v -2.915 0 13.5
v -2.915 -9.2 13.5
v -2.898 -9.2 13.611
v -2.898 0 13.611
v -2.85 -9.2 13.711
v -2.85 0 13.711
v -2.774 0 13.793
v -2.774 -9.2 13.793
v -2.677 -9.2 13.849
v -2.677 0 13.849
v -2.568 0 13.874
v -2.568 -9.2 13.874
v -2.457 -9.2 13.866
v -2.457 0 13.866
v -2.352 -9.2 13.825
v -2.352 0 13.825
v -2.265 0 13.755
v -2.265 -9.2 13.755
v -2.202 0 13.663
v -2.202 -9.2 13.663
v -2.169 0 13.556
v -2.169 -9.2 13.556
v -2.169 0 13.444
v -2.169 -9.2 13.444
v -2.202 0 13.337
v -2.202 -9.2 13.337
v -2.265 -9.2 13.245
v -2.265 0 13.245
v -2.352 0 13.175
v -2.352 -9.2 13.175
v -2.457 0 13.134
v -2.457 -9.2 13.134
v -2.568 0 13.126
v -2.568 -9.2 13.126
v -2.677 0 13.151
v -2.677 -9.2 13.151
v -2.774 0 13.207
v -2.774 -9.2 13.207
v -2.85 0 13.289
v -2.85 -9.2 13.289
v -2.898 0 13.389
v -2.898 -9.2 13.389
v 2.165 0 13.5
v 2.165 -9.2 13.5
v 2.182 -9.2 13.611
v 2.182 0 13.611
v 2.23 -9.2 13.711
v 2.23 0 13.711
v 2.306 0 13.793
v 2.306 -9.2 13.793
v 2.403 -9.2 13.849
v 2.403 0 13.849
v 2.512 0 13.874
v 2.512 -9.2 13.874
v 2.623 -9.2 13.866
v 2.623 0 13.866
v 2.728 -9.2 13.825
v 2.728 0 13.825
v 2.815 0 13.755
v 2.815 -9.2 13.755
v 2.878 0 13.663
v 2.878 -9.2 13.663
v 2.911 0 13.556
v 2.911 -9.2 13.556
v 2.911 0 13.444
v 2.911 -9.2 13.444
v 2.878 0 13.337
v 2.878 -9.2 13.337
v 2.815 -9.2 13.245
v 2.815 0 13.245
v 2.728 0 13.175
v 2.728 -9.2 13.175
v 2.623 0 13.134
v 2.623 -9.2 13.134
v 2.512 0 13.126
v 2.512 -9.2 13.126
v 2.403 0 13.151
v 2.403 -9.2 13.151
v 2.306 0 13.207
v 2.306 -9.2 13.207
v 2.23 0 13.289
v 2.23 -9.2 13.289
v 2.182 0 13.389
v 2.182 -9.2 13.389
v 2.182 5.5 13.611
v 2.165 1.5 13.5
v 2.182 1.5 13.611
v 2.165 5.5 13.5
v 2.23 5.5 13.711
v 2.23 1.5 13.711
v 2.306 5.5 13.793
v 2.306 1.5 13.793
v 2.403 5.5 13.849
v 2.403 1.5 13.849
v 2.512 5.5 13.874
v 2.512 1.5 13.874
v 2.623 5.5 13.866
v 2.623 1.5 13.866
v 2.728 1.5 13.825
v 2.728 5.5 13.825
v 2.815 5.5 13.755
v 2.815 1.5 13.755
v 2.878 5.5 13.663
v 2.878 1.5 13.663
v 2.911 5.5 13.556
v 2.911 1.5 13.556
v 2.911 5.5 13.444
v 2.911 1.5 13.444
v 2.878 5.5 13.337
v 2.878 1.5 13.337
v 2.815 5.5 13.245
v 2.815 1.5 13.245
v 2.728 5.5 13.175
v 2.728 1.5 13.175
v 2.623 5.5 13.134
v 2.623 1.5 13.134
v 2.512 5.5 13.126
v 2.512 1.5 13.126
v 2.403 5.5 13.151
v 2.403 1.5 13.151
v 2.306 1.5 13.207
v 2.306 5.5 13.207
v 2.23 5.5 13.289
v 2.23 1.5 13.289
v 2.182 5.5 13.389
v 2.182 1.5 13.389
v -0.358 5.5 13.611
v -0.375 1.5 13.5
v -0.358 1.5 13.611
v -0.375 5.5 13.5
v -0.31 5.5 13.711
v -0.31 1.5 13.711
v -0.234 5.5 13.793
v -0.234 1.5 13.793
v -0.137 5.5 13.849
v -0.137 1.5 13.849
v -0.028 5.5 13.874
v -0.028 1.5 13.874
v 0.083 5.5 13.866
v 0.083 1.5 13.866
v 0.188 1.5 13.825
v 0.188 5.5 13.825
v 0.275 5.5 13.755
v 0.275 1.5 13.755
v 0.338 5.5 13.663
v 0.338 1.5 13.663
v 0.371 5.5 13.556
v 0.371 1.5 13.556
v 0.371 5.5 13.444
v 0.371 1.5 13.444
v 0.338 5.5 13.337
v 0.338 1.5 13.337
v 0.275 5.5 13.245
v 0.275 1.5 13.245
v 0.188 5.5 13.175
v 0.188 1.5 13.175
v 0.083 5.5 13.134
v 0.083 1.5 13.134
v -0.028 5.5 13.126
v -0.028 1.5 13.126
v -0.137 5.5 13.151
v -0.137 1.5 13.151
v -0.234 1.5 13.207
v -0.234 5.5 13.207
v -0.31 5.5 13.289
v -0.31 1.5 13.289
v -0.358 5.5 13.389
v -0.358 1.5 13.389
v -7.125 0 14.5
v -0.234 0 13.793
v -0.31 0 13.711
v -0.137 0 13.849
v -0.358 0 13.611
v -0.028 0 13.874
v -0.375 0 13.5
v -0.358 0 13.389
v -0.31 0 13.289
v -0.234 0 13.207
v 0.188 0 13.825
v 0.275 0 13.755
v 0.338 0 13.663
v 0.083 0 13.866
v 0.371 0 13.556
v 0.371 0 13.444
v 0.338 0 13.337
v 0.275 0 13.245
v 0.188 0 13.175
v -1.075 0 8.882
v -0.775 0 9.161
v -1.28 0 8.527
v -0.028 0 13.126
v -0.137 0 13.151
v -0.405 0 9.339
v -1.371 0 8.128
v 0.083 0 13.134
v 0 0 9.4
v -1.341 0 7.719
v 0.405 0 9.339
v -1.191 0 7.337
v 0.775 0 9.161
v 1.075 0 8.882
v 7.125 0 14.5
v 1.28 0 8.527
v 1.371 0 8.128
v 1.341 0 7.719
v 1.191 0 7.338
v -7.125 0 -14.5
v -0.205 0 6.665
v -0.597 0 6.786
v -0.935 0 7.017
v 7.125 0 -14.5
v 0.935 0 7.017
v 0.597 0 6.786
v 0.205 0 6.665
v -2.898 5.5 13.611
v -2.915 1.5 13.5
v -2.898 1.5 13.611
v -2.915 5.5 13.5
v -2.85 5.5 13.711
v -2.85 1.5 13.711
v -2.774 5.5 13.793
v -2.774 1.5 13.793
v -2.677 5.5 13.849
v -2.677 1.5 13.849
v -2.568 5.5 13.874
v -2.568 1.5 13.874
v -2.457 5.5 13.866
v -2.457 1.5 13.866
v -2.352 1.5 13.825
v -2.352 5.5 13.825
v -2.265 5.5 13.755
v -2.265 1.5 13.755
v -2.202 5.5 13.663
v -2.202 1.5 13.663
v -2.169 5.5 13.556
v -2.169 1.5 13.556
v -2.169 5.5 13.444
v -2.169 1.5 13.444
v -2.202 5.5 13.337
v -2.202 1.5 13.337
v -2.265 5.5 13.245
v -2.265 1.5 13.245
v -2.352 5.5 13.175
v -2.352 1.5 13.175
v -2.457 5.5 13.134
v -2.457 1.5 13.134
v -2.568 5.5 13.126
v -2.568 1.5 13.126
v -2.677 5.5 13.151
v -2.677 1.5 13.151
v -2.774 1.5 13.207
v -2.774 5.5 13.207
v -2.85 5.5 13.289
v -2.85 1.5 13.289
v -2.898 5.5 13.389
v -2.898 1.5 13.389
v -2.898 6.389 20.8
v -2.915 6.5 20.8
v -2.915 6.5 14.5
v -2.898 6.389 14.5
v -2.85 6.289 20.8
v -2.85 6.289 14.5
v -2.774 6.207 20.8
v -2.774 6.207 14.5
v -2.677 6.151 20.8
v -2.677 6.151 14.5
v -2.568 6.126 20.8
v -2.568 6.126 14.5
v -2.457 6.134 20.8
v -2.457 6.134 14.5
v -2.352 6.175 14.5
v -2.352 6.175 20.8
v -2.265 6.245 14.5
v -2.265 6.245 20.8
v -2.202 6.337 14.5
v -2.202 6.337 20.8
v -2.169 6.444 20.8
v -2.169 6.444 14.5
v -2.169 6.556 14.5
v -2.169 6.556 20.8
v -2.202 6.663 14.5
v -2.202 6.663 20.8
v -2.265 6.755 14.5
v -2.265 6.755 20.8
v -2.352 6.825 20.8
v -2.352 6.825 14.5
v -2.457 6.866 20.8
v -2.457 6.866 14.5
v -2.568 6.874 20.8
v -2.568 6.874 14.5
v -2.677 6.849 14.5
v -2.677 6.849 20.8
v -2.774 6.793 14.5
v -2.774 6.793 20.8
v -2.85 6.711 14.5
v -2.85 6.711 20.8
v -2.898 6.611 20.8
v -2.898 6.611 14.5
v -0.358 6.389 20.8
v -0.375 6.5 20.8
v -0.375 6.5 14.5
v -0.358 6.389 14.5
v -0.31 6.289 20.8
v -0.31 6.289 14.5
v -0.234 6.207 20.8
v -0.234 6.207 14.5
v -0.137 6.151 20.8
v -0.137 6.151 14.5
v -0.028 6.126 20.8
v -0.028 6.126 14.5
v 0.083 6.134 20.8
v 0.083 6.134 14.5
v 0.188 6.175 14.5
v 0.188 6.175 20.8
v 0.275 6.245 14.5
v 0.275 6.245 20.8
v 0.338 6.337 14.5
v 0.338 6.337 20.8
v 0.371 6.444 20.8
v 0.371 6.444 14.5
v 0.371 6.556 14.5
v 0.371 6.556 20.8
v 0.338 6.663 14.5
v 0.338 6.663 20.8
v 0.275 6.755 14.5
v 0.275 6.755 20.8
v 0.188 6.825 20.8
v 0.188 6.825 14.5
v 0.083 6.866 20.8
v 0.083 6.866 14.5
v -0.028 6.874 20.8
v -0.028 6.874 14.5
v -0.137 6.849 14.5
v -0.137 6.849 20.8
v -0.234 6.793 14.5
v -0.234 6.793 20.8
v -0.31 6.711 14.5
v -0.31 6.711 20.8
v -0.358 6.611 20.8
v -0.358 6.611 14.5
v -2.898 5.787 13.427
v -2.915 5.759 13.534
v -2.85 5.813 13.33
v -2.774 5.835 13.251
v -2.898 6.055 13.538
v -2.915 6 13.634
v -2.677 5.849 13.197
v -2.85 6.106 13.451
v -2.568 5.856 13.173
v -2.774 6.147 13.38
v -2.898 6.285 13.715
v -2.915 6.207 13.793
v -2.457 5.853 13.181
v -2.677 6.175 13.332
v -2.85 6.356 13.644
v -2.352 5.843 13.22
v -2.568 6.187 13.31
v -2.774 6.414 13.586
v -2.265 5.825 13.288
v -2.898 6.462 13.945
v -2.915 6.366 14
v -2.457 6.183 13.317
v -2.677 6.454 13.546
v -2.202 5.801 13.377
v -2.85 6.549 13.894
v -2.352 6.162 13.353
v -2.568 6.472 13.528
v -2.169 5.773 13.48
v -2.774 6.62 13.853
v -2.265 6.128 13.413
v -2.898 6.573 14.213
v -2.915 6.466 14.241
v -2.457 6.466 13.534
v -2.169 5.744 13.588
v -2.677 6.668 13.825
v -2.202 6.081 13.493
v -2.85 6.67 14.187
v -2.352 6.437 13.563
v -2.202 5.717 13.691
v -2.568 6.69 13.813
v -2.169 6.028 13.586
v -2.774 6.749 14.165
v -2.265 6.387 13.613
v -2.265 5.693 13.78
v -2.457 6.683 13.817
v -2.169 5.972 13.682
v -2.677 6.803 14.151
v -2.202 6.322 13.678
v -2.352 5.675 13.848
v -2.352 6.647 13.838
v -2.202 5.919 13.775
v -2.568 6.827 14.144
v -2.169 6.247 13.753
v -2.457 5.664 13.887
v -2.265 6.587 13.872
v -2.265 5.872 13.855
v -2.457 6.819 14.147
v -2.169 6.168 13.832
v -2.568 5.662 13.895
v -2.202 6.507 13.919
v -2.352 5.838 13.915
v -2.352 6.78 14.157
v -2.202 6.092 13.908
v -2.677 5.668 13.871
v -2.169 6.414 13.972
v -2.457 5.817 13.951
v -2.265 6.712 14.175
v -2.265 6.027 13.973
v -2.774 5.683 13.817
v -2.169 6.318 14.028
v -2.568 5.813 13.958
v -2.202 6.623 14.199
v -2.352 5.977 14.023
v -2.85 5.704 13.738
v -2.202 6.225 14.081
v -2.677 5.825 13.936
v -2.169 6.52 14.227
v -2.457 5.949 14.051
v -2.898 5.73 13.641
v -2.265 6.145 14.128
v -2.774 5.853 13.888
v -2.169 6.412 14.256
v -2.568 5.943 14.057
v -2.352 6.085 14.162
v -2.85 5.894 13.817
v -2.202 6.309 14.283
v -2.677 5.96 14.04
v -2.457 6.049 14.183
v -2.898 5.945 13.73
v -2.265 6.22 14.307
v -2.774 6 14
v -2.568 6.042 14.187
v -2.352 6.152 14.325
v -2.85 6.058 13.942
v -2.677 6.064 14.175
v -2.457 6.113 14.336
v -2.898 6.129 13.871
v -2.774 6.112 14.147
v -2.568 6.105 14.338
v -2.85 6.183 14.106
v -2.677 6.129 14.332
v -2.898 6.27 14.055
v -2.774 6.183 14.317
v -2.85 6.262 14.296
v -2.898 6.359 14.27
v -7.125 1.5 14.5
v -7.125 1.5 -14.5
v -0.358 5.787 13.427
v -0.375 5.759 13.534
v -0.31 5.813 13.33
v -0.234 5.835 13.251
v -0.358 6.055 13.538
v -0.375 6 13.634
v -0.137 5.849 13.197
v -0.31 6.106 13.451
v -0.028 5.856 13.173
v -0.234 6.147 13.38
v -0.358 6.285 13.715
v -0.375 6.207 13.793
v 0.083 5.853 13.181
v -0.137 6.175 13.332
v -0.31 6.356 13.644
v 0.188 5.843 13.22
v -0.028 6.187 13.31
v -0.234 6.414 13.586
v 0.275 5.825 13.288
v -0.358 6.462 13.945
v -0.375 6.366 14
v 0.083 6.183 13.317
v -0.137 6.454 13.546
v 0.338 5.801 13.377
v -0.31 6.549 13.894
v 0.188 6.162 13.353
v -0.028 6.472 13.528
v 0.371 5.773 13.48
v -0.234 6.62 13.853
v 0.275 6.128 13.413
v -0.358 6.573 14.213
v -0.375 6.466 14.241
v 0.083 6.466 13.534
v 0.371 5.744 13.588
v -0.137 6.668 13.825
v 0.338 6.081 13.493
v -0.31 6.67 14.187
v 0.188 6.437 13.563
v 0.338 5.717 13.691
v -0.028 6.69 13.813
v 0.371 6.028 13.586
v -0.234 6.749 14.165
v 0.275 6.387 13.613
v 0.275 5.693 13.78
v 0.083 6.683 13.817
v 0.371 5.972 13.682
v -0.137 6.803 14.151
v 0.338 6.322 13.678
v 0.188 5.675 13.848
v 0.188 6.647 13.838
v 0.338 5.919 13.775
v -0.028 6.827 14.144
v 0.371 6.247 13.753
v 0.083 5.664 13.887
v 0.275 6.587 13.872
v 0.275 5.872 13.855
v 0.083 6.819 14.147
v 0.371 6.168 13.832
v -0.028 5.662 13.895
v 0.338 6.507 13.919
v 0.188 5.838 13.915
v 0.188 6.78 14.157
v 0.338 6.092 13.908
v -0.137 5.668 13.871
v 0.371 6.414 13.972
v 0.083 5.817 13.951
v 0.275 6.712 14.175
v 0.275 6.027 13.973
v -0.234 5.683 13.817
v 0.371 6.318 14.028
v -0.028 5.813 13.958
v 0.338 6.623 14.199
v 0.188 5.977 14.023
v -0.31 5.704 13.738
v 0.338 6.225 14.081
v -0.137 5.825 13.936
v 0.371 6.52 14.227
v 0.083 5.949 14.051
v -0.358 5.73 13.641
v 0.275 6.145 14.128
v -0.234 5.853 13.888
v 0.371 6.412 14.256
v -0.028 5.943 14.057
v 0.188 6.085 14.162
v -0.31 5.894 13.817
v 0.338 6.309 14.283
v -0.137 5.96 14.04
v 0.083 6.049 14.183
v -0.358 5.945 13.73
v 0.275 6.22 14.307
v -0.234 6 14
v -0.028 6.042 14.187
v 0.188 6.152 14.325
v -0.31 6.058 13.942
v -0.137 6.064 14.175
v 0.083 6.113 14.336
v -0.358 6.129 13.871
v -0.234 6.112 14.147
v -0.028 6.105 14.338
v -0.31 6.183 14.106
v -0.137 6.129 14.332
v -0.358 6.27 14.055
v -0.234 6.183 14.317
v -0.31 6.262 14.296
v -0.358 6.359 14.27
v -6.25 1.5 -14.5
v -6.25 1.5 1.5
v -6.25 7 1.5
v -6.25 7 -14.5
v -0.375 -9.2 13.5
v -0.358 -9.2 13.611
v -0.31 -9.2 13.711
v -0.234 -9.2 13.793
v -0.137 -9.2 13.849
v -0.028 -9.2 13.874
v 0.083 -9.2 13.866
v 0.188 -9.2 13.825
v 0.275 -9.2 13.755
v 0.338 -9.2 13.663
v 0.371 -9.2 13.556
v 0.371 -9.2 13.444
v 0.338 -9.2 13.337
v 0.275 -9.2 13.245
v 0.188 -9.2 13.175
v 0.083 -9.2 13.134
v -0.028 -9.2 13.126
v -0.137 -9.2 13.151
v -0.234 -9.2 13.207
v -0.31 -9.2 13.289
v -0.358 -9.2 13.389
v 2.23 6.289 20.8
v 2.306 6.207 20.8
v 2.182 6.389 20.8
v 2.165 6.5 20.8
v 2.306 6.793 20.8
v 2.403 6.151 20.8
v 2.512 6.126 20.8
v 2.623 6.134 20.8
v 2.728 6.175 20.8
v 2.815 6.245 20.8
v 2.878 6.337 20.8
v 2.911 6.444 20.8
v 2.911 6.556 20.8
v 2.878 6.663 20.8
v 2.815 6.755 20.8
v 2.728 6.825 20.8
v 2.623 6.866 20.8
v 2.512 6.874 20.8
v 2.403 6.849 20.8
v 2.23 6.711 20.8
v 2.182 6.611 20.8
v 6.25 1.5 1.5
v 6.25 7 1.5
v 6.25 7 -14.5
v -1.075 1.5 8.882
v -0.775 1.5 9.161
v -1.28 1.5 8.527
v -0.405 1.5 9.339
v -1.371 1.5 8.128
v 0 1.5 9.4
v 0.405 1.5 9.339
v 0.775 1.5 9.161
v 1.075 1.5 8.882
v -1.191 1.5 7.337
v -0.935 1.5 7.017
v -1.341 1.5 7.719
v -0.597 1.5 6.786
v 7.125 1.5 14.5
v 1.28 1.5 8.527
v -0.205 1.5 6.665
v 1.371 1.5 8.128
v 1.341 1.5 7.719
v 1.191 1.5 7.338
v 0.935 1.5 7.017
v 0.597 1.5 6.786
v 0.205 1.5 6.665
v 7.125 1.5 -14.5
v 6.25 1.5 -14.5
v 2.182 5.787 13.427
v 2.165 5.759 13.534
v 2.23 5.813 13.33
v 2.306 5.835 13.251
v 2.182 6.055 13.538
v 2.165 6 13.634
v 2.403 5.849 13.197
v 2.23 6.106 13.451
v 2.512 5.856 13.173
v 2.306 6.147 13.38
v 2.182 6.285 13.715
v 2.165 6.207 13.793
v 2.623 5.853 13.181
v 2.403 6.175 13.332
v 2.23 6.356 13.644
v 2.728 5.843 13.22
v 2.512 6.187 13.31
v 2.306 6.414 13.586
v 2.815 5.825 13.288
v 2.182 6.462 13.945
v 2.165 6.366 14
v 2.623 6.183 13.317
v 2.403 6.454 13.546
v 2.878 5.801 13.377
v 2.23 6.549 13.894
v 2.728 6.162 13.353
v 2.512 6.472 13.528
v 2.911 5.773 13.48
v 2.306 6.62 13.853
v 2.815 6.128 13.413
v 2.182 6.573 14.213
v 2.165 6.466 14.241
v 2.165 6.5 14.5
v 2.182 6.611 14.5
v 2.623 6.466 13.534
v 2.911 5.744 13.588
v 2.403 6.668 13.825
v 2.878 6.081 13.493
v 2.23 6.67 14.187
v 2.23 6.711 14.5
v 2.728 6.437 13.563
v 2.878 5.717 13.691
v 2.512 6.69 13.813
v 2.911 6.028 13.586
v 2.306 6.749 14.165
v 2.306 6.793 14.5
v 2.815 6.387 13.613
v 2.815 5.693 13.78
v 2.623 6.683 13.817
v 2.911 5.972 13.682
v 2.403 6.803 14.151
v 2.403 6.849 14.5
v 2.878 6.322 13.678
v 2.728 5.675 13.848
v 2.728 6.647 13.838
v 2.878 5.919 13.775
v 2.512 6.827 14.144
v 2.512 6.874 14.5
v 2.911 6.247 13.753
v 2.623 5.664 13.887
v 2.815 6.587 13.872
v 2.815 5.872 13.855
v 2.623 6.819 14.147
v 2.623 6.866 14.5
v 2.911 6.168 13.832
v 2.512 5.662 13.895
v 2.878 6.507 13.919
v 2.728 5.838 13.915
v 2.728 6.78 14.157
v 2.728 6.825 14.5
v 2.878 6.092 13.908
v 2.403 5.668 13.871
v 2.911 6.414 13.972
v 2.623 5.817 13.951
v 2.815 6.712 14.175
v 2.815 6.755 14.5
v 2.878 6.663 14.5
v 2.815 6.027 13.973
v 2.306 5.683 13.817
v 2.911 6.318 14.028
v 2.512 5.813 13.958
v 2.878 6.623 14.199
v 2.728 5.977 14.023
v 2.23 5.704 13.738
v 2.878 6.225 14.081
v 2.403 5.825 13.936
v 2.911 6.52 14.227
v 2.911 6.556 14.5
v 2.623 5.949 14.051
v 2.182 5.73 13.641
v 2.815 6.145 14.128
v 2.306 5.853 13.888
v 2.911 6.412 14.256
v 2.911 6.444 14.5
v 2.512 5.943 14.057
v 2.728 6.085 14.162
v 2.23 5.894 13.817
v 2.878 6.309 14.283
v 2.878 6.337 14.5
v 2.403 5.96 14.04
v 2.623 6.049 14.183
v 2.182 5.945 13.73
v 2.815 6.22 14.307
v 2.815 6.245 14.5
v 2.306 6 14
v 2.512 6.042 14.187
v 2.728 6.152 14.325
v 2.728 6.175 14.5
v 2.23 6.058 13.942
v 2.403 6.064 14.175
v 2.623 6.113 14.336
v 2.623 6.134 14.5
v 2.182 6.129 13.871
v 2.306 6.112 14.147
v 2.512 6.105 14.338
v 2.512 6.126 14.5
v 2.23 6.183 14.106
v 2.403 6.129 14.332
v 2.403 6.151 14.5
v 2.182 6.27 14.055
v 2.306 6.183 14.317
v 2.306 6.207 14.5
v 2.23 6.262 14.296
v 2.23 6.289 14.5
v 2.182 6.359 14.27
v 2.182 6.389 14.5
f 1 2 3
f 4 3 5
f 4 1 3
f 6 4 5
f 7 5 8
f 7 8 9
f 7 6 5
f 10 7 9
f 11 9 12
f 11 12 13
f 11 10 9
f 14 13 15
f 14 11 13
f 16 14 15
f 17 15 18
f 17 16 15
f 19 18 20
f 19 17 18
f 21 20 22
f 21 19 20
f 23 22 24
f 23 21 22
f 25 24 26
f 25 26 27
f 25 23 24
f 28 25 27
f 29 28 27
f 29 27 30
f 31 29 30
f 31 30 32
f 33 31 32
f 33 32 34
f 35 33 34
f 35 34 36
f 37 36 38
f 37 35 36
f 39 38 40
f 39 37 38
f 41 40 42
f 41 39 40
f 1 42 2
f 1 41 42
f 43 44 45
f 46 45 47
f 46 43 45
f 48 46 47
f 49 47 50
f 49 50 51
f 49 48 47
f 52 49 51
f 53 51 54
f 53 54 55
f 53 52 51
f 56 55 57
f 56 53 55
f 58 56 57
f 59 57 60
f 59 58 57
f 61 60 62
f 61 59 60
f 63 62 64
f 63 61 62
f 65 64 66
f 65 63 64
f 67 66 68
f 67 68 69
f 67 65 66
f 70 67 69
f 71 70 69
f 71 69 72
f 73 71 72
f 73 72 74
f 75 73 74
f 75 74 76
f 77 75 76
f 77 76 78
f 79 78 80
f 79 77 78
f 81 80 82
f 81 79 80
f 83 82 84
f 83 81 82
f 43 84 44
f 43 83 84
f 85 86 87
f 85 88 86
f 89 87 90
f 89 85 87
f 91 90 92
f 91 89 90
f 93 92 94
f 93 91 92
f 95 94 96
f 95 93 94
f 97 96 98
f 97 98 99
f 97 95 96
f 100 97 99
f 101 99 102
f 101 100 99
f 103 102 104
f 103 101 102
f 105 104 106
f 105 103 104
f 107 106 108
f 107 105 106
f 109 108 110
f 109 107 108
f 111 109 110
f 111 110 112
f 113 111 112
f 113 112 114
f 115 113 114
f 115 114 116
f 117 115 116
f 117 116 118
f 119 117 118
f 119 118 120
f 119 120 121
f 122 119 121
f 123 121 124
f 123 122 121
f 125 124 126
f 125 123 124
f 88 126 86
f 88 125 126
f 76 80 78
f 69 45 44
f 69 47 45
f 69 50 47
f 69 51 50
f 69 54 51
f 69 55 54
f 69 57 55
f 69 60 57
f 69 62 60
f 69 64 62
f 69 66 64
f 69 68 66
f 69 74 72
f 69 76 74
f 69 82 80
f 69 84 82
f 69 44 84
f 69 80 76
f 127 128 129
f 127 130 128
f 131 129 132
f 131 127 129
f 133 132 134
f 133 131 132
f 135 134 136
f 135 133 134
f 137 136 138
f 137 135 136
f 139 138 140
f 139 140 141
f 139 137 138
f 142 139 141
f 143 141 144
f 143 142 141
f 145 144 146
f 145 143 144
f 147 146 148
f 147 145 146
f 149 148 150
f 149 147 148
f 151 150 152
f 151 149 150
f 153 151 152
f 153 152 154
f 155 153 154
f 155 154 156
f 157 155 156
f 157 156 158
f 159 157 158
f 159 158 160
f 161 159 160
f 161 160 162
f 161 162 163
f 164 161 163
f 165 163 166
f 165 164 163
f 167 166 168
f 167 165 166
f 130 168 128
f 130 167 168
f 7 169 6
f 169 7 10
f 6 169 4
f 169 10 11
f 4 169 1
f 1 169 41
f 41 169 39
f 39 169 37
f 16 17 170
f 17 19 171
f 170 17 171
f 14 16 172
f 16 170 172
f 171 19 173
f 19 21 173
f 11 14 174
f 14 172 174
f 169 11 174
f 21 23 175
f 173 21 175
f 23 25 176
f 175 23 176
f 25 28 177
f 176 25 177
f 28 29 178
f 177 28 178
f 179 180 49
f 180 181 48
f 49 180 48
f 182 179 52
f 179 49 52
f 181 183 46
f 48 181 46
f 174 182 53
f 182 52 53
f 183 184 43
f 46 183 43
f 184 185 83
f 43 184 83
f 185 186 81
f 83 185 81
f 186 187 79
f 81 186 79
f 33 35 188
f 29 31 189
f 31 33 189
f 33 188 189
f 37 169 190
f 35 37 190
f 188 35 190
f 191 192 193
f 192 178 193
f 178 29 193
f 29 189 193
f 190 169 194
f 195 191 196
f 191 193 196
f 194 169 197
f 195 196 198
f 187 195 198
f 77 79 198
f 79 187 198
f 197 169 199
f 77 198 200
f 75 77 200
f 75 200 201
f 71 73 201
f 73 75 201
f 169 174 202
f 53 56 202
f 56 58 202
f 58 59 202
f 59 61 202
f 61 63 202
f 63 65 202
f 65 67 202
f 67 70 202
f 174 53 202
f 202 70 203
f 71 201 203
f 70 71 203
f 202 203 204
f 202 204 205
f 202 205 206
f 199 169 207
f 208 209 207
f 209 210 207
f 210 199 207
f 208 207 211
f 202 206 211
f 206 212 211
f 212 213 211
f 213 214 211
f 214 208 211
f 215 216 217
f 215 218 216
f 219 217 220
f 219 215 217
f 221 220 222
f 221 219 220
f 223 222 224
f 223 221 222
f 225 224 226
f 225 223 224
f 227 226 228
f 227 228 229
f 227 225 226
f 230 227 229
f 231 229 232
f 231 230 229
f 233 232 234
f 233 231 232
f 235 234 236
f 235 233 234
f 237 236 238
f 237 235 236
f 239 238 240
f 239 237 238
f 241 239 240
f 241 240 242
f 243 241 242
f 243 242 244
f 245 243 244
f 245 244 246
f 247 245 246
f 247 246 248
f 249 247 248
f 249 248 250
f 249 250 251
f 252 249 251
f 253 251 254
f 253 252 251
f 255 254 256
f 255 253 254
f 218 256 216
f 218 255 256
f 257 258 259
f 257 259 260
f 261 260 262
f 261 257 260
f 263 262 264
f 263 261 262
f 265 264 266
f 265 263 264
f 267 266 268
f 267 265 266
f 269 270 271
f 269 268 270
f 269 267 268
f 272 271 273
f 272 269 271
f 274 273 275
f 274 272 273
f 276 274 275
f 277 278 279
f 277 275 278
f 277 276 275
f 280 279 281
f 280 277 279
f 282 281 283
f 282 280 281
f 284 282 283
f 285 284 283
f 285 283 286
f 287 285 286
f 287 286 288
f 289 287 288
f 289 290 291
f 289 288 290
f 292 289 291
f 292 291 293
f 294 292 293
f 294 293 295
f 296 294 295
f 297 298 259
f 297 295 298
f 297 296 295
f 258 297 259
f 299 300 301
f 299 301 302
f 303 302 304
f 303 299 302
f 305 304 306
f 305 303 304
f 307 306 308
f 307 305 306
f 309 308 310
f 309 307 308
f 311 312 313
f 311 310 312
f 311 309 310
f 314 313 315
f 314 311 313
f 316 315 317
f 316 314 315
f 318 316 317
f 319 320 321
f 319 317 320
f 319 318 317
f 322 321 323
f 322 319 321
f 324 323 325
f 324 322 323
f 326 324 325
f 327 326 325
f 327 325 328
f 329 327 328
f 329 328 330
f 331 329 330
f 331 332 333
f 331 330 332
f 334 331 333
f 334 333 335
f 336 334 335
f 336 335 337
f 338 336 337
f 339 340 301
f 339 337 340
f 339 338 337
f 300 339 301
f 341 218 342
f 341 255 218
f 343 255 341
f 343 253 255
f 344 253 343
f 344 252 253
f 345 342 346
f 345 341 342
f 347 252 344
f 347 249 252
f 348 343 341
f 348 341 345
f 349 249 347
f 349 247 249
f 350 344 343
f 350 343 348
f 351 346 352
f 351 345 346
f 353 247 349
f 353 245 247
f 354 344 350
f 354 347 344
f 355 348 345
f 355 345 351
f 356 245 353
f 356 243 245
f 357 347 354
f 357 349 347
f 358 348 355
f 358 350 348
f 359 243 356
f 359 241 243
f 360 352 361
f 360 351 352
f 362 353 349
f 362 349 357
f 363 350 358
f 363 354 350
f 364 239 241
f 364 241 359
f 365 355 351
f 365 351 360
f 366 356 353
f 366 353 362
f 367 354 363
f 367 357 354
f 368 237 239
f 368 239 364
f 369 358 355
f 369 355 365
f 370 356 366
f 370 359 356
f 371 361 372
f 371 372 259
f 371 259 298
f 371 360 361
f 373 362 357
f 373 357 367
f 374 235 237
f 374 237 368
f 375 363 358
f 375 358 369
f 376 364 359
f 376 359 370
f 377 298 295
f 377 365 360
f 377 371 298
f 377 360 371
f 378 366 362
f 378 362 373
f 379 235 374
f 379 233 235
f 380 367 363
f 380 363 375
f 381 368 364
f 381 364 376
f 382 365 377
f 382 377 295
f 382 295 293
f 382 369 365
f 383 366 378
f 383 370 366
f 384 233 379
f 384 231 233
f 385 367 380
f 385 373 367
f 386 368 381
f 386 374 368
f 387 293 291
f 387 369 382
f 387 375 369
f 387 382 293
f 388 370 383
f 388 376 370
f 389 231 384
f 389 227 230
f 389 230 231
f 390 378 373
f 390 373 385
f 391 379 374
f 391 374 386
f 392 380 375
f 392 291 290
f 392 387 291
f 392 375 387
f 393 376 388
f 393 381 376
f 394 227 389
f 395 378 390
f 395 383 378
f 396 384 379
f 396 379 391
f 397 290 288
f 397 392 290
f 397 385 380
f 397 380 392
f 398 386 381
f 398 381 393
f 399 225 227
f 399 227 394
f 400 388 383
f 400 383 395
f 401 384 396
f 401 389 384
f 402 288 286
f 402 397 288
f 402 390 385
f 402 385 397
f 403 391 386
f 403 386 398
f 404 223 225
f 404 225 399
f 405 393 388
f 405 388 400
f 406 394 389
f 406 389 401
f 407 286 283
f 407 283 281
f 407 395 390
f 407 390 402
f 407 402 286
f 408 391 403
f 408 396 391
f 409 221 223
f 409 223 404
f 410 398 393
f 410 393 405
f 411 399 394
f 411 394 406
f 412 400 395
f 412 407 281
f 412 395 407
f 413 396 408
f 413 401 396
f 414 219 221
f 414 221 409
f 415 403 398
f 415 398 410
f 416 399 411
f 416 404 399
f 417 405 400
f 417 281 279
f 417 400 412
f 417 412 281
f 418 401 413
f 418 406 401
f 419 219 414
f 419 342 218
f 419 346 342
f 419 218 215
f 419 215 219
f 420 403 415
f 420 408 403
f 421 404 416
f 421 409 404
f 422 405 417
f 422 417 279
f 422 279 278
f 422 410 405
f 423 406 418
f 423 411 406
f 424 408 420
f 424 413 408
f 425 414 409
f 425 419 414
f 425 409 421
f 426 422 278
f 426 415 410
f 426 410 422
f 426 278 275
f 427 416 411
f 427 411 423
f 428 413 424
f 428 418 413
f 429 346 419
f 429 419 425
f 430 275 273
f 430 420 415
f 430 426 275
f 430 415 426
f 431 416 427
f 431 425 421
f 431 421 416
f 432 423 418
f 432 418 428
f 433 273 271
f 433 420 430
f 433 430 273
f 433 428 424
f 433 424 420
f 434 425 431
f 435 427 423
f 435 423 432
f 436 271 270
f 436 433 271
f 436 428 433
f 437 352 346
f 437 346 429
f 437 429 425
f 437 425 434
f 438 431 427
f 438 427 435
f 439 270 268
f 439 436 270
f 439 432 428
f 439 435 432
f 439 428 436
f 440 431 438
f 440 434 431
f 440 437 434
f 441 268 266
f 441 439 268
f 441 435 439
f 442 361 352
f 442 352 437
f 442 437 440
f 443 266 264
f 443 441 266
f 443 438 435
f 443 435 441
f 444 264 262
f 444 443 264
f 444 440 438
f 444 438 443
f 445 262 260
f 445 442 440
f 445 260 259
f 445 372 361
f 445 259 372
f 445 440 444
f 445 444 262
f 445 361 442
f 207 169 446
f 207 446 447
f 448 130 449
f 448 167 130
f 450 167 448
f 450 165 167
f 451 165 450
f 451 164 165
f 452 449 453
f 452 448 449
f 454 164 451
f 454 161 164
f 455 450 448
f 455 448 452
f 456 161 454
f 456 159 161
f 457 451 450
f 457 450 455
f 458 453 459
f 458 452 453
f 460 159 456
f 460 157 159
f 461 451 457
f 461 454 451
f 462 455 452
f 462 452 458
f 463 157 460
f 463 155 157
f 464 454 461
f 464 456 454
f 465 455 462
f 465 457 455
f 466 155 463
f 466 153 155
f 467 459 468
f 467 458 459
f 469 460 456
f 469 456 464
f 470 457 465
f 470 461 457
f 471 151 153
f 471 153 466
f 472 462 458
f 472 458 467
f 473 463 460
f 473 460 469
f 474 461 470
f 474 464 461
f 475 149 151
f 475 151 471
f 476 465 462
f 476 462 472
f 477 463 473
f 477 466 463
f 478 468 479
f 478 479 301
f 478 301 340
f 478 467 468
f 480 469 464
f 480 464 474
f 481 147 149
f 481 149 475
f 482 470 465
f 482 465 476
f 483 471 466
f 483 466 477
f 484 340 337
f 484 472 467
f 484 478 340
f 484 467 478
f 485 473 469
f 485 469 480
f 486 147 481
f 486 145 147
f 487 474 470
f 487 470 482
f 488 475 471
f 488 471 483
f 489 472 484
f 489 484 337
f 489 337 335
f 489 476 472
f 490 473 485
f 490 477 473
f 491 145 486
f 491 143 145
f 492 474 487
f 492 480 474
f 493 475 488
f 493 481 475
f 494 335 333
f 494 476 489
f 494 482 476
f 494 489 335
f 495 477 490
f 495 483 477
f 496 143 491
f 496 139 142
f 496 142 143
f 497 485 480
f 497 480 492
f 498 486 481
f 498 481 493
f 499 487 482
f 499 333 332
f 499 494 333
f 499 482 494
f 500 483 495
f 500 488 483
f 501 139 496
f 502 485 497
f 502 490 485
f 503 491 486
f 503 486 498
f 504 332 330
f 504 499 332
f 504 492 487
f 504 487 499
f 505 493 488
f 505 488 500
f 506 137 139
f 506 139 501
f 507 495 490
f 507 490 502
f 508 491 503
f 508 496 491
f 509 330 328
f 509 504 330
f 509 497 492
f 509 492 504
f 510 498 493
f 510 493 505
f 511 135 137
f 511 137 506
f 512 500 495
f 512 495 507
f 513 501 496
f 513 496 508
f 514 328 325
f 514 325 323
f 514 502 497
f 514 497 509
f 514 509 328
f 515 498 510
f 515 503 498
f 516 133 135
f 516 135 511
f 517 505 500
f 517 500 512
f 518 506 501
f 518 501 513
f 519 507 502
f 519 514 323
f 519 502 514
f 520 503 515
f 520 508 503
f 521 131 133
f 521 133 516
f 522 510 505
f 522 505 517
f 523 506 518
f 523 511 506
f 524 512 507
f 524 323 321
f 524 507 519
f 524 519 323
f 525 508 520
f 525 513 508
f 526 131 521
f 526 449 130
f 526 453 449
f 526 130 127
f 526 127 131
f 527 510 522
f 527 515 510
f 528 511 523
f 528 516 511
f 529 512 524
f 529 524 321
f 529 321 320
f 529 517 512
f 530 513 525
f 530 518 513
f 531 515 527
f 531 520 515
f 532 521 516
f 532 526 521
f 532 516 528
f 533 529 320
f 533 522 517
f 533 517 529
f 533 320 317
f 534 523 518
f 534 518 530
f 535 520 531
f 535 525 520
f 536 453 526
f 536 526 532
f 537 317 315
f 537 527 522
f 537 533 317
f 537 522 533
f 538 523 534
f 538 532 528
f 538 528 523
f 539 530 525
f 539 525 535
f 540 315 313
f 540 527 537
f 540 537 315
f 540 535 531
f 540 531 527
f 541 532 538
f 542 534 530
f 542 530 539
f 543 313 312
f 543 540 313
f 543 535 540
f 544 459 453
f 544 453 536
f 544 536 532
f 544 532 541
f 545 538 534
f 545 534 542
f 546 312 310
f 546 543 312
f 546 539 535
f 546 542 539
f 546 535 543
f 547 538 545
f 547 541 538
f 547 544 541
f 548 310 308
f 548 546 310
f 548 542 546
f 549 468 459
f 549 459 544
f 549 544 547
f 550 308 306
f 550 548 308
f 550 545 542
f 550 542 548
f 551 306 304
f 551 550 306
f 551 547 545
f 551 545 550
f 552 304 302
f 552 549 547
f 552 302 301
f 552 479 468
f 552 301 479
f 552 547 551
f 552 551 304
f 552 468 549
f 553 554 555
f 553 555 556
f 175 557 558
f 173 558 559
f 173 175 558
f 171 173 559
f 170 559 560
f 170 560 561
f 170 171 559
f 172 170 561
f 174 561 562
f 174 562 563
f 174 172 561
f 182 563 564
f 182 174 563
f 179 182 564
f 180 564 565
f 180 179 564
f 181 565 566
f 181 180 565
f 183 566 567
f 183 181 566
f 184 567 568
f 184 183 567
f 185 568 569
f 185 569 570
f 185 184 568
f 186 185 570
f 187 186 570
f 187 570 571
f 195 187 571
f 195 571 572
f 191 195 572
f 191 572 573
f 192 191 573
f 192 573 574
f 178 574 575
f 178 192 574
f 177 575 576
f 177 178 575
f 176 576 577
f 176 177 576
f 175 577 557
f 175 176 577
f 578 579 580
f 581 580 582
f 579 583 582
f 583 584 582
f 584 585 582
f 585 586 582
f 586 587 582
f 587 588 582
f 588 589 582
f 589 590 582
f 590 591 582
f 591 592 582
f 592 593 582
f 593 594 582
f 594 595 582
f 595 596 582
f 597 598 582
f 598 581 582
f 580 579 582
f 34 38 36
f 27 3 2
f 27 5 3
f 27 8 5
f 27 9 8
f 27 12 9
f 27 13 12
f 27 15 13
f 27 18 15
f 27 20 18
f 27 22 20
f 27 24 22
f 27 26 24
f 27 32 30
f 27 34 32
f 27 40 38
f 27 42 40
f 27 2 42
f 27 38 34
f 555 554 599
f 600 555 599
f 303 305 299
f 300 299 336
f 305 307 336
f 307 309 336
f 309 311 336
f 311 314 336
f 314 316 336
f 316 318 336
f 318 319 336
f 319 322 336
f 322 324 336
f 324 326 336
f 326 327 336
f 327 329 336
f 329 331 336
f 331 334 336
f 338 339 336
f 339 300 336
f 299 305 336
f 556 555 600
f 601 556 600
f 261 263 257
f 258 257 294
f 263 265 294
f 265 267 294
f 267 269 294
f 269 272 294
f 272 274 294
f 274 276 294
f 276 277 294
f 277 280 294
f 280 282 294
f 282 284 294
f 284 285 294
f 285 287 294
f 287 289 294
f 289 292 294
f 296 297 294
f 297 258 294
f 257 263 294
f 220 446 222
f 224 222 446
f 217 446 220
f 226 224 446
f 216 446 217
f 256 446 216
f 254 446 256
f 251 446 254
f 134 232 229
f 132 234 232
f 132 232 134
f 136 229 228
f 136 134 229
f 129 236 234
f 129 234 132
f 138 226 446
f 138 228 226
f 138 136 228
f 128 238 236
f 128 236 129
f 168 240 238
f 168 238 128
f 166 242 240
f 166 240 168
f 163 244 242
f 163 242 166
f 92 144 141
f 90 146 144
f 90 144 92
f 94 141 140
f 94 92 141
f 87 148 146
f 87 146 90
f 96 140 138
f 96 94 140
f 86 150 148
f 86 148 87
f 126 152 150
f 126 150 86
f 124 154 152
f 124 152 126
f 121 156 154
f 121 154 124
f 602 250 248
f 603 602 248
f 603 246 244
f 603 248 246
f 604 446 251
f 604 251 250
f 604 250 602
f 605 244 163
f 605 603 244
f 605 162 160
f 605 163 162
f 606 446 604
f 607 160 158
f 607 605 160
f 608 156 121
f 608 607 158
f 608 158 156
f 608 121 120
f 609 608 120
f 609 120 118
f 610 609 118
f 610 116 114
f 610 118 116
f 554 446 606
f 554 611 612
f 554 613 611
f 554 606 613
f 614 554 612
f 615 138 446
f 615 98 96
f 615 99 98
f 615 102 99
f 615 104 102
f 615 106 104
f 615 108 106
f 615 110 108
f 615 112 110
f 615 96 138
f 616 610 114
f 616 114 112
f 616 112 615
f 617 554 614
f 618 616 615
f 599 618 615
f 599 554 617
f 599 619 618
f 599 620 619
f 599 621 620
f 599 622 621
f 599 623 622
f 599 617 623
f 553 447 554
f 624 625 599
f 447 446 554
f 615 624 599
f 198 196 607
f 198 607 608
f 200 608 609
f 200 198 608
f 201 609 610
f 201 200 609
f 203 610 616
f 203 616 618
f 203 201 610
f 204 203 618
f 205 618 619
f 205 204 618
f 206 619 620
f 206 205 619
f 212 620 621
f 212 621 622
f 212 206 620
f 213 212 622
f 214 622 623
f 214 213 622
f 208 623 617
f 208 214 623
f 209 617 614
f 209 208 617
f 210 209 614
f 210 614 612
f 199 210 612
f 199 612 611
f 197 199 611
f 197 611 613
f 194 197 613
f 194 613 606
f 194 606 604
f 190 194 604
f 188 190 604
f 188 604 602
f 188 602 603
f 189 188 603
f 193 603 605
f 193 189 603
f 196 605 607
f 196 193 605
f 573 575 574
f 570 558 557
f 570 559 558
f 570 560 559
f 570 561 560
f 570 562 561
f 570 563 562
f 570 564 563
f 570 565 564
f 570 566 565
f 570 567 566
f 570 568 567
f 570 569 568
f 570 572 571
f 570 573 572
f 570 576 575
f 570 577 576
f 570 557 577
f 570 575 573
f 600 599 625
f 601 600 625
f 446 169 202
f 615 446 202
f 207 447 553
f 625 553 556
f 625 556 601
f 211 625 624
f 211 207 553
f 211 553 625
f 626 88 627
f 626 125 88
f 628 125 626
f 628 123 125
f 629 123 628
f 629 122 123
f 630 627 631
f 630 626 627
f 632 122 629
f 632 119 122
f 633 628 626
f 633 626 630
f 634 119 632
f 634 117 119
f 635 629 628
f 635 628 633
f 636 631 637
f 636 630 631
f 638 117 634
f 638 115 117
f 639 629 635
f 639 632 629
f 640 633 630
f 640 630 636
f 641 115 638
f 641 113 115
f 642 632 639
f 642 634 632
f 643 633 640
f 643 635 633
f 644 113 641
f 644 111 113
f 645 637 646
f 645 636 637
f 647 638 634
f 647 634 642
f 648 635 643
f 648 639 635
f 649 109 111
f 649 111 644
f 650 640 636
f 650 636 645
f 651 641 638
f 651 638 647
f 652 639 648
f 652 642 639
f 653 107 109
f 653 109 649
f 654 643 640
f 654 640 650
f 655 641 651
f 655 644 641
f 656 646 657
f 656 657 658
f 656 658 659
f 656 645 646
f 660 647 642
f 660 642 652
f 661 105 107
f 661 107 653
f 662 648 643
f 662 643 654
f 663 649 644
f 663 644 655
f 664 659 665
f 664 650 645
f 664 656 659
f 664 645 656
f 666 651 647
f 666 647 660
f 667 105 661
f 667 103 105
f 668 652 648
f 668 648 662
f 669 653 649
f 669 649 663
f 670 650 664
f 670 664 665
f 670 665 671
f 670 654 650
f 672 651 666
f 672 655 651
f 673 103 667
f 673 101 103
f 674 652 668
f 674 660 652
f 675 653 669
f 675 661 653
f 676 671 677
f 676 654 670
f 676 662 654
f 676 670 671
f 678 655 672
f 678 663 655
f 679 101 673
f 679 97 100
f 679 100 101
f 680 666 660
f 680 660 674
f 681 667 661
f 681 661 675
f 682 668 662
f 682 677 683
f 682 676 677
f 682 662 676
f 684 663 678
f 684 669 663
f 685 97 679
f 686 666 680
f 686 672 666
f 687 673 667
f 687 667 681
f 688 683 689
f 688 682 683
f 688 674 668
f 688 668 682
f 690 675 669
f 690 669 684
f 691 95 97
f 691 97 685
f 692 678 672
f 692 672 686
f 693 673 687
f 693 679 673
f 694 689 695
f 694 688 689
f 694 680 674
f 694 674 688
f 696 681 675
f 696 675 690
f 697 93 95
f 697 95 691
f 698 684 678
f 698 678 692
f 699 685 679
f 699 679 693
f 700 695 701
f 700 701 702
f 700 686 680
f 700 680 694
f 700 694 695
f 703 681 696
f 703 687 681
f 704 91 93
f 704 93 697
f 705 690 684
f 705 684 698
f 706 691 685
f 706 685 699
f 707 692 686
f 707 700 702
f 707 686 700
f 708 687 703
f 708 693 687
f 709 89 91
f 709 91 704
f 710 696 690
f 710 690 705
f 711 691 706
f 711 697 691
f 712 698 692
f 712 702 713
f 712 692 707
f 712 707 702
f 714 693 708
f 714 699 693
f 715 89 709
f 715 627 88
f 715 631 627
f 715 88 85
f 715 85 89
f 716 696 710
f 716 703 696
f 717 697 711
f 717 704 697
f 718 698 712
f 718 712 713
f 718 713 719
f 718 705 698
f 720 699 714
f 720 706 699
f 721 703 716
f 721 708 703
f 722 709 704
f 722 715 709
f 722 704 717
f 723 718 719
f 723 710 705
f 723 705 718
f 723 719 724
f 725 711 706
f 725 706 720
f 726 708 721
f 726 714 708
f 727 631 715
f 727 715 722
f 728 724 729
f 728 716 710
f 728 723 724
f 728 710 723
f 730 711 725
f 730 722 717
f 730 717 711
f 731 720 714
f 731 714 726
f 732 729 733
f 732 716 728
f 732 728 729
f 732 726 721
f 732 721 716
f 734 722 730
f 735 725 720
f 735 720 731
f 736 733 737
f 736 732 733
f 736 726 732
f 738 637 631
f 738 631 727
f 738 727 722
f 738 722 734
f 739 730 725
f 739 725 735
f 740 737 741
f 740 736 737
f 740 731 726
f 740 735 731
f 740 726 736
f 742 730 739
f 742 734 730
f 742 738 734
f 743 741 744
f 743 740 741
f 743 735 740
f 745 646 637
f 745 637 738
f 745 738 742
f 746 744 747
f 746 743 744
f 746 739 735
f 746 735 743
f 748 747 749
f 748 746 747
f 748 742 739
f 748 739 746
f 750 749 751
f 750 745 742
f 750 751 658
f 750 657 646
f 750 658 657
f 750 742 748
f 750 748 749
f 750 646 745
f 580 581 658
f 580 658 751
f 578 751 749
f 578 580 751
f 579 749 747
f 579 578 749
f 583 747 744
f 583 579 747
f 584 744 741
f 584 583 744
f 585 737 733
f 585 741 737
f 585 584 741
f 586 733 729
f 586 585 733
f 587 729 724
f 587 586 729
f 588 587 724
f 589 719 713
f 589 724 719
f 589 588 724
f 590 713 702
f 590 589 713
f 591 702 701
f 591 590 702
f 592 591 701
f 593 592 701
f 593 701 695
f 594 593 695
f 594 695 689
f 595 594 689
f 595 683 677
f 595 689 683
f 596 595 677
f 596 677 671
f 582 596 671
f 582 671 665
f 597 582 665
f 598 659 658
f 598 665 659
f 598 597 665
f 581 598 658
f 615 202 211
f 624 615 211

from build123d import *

# Parameters (mm, degrees)
SKETCH1_W           = 14.25
SKETCH1_H           = 29
SKETCH1_R           = 1.375
BOSS_EXTRUDE1_DEPTH = 1.5
SKETCH2_W           = 12.5
SKETCH2_H           = 16
BOSS_EXTRUDE2_DEPTH = 5.5
SKETCH4_R           = 0.375
LPATTERN1_COUNT     = 2
LPATTERN1_PITCH     = 2.54
LPATTERN1_COL_COUNT = 2
LPATTERN1_COL_PITCH = 2.54
MOVE_FACE1_BY       = 8.2
MOVE_FACE1_2_BY     = 8.2
MOVE_FACE1_3_BY     = 8.2


with BuildPart() as part:
    # Sketch1 → Boss-Extrude1 (new body)
    with BuildSketch(Plane(origin=(0, 0, 0), x_dir=(1, 0, 0), z_dir=(0, 1, 0))):
        Rectangle(SKETCH1_W, SKETCH1_H)
        with Locations(Location((0, -8.025, 0), (0, 0, 270))):
            Circle(SKETCH1_R, mode=Mode.SUBTRACT)
    extrude(amount=BOSS_EXTRUDE1_DEPTH)

    # Sketch2 → Boss-Extrude2 (add)
    with BuildSketch(Plane(origin=(0, 1.5, 0), x_dir=(1, 0, 0), z_dir=(0, 1, 0))):
        with Locations((0, 6.5)):
            Rectangle(SKETCH2_W, SKETCH2_H)
    extrude(amount=BOSS_EXTRUDE2_DEPTH)

    # Sweep1: sweep along a path in Sketch3
    with BuildLine(Plane.ZY) as sweep1_path:
        Line((13.5, -1), (13.5, 5.5))
        ThreePointArc((13.5, 5.5), (13.792893219, 6.207106781), (14.5, 6.5))
        Line((14.5, 6.5), (20.8, 6.5))
    # Sketch4 → Sweep1 (sweep)
    with BuildSketch(Plane(origin=(0, -1, 0), x_dir=(-1, 0, 0), z_dir=(0, -1, 0))):
        with Locations((0, -13.5)):
            Circle(SKETCH4_R)
    sweep1 = sweep(path=sweep1_path.line)

    # LPattern1: Sweep1 ×2
    with Locations(*[(-i * LPATTERN1_PITCH, 0, 0) for i in range(1, LPATTERN1_COUNT)]):
        add(sweep1)

    # LPattern1 col: Sweep1 ×2
    with Locations(*[(i * LPATTERN1_COL_PITCH, 0, 0) for i in range(1, LPATTERN1_COL_COUNT)]):
        add(sweep1)

    # Move Face1: a face moved outward by 8.2
    extrude(part.faces().sort_by_distance((2.54, -1, 13.5))[0], amount=MOVE_FACE1_BY, dir=(0, -1, 0))

    # Move Face1 2: a face moved outward by 8.2
    extrude(part.faces().sort_by_distance((0, -1, 13.5))[0], amount=MOVE_FACE1_2_BY, dir=(0, -1, 0))

    # Move Face1 3: a face moved outward by 8.2
    extrude(part.faces().sort_by_distance((-2.54, -1, 13.5))[0], amount=MOVE_FACE1_3_BY, dir=(0, -1, 0))


solid = part.part
